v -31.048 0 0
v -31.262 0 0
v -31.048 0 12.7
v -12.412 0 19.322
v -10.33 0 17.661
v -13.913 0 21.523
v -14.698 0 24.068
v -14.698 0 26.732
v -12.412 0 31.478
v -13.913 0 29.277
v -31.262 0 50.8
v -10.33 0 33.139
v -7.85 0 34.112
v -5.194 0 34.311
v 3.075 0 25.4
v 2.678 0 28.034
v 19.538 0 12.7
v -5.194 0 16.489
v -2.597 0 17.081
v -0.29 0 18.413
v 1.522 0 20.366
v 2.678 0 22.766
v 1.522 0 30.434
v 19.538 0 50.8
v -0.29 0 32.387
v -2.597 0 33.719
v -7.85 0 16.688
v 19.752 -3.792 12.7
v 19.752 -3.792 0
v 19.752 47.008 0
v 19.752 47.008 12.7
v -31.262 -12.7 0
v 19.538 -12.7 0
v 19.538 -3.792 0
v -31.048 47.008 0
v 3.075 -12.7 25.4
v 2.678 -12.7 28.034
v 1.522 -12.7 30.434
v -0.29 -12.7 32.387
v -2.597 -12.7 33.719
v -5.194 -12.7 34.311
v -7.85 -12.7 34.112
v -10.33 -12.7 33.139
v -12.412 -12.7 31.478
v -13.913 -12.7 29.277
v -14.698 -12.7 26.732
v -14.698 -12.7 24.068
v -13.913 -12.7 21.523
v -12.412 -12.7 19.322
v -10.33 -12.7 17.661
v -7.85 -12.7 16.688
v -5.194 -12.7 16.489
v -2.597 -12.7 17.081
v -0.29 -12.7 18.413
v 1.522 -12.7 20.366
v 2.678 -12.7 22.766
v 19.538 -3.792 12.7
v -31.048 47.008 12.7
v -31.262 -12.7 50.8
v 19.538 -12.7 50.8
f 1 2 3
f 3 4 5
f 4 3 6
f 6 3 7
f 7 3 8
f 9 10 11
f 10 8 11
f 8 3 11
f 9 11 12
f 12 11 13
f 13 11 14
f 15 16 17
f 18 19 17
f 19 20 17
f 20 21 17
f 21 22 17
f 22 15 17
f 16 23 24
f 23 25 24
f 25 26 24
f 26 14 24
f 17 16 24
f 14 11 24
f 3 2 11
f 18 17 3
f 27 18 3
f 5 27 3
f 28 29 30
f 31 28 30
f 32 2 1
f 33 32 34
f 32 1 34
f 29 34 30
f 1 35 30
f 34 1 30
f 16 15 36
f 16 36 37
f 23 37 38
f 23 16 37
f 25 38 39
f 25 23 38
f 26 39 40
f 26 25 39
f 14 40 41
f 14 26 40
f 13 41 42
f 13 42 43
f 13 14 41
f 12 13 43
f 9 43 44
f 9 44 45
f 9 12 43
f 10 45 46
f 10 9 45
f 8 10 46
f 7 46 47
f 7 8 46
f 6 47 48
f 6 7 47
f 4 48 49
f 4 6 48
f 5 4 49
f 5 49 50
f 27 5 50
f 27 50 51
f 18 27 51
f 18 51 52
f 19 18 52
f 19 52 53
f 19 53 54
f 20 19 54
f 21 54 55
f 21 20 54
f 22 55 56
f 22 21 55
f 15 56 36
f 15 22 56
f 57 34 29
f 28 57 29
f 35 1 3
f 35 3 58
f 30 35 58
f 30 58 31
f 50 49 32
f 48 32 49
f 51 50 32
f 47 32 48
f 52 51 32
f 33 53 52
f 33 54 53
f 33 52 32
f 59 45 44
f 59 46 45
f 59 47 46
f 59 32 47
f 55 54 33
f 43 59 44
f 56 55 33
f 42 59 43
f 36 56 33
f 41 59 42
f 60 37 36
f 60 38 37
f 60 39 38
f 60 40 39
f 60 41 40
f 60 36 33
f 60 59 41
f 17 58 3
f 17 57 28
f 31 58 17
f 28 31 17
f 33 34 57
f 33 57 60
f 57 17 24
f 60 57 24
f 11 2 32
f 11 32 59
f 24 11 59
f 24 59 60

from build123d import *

# Parameters (mm, degrees)
F0_W     = 50.8
F0_H     = 50.8
F1_DEPTH = 12.7
F2_W     = 50.8
F2_H     = 50.8
F2_R     = 8.936433
F3_DEPTH = 12.7
F4_DEPTH = 12.7


with BuildPart() as f1:
    # F0 (on Top) → F1 (new body)
    with BuildSketch(Plane.XY):
        with Locations((-5.648404, 21.607813)):
            Rectangle(F0_W, F0_H)
    extrude(amount=F1_DEPTH)

    # F2 (on Front) → F3 (join)
    with BuildSketch(Plane.XZ):
        with Locations((-5.861539, 25.4)):
            Rectangle(F2_W, F2_H)
        with Locations((-5.861539, 25.4)):
            Circle(F2_R, mode=Mode.SUBTRACT)
    extrude(amount=F3_DEPTH)

    # F2 (on Front) → F4 (join)
    with BuildSketch(Plane.XZ):
        with Locations((-5.861539, 25.4)):
            Rectangle(F2_W, F2_H)
        with Locations((-5.861539, 25.4)):
            Circle(F2_R, mode=Mode.SUBTRACT)
    extrude(amount=F4_DEPTH)


solid = f1.part
